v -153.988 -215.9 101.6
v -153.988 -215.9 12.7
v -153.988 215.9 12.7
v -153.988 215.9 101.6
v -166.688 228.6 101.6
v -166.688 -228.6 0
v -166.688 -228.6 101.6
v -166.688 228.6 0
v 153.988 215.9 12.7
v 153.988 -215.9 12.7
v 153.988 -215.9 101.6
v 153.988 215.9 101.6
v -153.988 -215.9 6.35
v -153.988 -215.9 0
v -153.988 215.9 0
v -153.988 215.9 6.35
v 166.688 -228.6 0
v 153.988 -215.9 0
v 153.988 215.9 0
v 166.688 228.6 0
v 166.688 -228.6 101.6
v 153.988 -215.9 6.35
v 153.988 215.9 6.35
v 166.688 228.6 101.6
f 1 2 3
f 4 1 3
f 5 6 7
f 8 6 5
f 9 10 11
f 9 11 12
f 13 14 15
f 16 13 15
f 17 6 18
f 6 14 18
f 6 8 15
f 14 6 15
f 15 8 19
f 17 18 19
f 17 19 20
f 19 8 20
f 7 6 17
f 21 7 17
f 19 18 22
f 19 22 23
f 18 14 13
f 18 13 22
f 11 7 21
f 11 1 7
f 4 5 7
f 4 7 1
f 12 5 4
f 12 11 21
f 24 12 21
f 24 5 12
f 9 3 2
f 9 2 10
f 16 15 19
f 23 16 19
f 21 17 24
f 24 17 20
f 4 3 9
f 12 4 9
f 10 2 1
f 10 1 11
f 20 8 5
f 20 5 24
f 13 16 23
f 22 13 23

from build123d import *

# Parameters (mm, degrees)
F0_W     = 333.375
F0_H     = 457.2
F0_W_2   = 307.975
F0_H_2   = 431.8
F1_DEPTH = 101.6
F2_W     = 307.975
F2_H     = 6.35
F3_DEPTH = 431.8


with BuildPart() as f1:
    # F0 (on Top) → F1 (new body)
    with BuildSketch(Plane.XY):
        Rectangle(F0_W, F0_H)
        Rectangle(F0_W_2, F0_H_2, mode=Mode.SUBTRACT)
    extrude(amount=F1_DEPTH)

    # F2 (on face) → F3 (join)
    with BuildSketch(Plane.XZ.offset(-215.9)):
        with Locations((0, 9.525)):
            Rectangle(F2_W, F2_H)
    extrude(amount=F3_DEPTH)


solid = f1.part
